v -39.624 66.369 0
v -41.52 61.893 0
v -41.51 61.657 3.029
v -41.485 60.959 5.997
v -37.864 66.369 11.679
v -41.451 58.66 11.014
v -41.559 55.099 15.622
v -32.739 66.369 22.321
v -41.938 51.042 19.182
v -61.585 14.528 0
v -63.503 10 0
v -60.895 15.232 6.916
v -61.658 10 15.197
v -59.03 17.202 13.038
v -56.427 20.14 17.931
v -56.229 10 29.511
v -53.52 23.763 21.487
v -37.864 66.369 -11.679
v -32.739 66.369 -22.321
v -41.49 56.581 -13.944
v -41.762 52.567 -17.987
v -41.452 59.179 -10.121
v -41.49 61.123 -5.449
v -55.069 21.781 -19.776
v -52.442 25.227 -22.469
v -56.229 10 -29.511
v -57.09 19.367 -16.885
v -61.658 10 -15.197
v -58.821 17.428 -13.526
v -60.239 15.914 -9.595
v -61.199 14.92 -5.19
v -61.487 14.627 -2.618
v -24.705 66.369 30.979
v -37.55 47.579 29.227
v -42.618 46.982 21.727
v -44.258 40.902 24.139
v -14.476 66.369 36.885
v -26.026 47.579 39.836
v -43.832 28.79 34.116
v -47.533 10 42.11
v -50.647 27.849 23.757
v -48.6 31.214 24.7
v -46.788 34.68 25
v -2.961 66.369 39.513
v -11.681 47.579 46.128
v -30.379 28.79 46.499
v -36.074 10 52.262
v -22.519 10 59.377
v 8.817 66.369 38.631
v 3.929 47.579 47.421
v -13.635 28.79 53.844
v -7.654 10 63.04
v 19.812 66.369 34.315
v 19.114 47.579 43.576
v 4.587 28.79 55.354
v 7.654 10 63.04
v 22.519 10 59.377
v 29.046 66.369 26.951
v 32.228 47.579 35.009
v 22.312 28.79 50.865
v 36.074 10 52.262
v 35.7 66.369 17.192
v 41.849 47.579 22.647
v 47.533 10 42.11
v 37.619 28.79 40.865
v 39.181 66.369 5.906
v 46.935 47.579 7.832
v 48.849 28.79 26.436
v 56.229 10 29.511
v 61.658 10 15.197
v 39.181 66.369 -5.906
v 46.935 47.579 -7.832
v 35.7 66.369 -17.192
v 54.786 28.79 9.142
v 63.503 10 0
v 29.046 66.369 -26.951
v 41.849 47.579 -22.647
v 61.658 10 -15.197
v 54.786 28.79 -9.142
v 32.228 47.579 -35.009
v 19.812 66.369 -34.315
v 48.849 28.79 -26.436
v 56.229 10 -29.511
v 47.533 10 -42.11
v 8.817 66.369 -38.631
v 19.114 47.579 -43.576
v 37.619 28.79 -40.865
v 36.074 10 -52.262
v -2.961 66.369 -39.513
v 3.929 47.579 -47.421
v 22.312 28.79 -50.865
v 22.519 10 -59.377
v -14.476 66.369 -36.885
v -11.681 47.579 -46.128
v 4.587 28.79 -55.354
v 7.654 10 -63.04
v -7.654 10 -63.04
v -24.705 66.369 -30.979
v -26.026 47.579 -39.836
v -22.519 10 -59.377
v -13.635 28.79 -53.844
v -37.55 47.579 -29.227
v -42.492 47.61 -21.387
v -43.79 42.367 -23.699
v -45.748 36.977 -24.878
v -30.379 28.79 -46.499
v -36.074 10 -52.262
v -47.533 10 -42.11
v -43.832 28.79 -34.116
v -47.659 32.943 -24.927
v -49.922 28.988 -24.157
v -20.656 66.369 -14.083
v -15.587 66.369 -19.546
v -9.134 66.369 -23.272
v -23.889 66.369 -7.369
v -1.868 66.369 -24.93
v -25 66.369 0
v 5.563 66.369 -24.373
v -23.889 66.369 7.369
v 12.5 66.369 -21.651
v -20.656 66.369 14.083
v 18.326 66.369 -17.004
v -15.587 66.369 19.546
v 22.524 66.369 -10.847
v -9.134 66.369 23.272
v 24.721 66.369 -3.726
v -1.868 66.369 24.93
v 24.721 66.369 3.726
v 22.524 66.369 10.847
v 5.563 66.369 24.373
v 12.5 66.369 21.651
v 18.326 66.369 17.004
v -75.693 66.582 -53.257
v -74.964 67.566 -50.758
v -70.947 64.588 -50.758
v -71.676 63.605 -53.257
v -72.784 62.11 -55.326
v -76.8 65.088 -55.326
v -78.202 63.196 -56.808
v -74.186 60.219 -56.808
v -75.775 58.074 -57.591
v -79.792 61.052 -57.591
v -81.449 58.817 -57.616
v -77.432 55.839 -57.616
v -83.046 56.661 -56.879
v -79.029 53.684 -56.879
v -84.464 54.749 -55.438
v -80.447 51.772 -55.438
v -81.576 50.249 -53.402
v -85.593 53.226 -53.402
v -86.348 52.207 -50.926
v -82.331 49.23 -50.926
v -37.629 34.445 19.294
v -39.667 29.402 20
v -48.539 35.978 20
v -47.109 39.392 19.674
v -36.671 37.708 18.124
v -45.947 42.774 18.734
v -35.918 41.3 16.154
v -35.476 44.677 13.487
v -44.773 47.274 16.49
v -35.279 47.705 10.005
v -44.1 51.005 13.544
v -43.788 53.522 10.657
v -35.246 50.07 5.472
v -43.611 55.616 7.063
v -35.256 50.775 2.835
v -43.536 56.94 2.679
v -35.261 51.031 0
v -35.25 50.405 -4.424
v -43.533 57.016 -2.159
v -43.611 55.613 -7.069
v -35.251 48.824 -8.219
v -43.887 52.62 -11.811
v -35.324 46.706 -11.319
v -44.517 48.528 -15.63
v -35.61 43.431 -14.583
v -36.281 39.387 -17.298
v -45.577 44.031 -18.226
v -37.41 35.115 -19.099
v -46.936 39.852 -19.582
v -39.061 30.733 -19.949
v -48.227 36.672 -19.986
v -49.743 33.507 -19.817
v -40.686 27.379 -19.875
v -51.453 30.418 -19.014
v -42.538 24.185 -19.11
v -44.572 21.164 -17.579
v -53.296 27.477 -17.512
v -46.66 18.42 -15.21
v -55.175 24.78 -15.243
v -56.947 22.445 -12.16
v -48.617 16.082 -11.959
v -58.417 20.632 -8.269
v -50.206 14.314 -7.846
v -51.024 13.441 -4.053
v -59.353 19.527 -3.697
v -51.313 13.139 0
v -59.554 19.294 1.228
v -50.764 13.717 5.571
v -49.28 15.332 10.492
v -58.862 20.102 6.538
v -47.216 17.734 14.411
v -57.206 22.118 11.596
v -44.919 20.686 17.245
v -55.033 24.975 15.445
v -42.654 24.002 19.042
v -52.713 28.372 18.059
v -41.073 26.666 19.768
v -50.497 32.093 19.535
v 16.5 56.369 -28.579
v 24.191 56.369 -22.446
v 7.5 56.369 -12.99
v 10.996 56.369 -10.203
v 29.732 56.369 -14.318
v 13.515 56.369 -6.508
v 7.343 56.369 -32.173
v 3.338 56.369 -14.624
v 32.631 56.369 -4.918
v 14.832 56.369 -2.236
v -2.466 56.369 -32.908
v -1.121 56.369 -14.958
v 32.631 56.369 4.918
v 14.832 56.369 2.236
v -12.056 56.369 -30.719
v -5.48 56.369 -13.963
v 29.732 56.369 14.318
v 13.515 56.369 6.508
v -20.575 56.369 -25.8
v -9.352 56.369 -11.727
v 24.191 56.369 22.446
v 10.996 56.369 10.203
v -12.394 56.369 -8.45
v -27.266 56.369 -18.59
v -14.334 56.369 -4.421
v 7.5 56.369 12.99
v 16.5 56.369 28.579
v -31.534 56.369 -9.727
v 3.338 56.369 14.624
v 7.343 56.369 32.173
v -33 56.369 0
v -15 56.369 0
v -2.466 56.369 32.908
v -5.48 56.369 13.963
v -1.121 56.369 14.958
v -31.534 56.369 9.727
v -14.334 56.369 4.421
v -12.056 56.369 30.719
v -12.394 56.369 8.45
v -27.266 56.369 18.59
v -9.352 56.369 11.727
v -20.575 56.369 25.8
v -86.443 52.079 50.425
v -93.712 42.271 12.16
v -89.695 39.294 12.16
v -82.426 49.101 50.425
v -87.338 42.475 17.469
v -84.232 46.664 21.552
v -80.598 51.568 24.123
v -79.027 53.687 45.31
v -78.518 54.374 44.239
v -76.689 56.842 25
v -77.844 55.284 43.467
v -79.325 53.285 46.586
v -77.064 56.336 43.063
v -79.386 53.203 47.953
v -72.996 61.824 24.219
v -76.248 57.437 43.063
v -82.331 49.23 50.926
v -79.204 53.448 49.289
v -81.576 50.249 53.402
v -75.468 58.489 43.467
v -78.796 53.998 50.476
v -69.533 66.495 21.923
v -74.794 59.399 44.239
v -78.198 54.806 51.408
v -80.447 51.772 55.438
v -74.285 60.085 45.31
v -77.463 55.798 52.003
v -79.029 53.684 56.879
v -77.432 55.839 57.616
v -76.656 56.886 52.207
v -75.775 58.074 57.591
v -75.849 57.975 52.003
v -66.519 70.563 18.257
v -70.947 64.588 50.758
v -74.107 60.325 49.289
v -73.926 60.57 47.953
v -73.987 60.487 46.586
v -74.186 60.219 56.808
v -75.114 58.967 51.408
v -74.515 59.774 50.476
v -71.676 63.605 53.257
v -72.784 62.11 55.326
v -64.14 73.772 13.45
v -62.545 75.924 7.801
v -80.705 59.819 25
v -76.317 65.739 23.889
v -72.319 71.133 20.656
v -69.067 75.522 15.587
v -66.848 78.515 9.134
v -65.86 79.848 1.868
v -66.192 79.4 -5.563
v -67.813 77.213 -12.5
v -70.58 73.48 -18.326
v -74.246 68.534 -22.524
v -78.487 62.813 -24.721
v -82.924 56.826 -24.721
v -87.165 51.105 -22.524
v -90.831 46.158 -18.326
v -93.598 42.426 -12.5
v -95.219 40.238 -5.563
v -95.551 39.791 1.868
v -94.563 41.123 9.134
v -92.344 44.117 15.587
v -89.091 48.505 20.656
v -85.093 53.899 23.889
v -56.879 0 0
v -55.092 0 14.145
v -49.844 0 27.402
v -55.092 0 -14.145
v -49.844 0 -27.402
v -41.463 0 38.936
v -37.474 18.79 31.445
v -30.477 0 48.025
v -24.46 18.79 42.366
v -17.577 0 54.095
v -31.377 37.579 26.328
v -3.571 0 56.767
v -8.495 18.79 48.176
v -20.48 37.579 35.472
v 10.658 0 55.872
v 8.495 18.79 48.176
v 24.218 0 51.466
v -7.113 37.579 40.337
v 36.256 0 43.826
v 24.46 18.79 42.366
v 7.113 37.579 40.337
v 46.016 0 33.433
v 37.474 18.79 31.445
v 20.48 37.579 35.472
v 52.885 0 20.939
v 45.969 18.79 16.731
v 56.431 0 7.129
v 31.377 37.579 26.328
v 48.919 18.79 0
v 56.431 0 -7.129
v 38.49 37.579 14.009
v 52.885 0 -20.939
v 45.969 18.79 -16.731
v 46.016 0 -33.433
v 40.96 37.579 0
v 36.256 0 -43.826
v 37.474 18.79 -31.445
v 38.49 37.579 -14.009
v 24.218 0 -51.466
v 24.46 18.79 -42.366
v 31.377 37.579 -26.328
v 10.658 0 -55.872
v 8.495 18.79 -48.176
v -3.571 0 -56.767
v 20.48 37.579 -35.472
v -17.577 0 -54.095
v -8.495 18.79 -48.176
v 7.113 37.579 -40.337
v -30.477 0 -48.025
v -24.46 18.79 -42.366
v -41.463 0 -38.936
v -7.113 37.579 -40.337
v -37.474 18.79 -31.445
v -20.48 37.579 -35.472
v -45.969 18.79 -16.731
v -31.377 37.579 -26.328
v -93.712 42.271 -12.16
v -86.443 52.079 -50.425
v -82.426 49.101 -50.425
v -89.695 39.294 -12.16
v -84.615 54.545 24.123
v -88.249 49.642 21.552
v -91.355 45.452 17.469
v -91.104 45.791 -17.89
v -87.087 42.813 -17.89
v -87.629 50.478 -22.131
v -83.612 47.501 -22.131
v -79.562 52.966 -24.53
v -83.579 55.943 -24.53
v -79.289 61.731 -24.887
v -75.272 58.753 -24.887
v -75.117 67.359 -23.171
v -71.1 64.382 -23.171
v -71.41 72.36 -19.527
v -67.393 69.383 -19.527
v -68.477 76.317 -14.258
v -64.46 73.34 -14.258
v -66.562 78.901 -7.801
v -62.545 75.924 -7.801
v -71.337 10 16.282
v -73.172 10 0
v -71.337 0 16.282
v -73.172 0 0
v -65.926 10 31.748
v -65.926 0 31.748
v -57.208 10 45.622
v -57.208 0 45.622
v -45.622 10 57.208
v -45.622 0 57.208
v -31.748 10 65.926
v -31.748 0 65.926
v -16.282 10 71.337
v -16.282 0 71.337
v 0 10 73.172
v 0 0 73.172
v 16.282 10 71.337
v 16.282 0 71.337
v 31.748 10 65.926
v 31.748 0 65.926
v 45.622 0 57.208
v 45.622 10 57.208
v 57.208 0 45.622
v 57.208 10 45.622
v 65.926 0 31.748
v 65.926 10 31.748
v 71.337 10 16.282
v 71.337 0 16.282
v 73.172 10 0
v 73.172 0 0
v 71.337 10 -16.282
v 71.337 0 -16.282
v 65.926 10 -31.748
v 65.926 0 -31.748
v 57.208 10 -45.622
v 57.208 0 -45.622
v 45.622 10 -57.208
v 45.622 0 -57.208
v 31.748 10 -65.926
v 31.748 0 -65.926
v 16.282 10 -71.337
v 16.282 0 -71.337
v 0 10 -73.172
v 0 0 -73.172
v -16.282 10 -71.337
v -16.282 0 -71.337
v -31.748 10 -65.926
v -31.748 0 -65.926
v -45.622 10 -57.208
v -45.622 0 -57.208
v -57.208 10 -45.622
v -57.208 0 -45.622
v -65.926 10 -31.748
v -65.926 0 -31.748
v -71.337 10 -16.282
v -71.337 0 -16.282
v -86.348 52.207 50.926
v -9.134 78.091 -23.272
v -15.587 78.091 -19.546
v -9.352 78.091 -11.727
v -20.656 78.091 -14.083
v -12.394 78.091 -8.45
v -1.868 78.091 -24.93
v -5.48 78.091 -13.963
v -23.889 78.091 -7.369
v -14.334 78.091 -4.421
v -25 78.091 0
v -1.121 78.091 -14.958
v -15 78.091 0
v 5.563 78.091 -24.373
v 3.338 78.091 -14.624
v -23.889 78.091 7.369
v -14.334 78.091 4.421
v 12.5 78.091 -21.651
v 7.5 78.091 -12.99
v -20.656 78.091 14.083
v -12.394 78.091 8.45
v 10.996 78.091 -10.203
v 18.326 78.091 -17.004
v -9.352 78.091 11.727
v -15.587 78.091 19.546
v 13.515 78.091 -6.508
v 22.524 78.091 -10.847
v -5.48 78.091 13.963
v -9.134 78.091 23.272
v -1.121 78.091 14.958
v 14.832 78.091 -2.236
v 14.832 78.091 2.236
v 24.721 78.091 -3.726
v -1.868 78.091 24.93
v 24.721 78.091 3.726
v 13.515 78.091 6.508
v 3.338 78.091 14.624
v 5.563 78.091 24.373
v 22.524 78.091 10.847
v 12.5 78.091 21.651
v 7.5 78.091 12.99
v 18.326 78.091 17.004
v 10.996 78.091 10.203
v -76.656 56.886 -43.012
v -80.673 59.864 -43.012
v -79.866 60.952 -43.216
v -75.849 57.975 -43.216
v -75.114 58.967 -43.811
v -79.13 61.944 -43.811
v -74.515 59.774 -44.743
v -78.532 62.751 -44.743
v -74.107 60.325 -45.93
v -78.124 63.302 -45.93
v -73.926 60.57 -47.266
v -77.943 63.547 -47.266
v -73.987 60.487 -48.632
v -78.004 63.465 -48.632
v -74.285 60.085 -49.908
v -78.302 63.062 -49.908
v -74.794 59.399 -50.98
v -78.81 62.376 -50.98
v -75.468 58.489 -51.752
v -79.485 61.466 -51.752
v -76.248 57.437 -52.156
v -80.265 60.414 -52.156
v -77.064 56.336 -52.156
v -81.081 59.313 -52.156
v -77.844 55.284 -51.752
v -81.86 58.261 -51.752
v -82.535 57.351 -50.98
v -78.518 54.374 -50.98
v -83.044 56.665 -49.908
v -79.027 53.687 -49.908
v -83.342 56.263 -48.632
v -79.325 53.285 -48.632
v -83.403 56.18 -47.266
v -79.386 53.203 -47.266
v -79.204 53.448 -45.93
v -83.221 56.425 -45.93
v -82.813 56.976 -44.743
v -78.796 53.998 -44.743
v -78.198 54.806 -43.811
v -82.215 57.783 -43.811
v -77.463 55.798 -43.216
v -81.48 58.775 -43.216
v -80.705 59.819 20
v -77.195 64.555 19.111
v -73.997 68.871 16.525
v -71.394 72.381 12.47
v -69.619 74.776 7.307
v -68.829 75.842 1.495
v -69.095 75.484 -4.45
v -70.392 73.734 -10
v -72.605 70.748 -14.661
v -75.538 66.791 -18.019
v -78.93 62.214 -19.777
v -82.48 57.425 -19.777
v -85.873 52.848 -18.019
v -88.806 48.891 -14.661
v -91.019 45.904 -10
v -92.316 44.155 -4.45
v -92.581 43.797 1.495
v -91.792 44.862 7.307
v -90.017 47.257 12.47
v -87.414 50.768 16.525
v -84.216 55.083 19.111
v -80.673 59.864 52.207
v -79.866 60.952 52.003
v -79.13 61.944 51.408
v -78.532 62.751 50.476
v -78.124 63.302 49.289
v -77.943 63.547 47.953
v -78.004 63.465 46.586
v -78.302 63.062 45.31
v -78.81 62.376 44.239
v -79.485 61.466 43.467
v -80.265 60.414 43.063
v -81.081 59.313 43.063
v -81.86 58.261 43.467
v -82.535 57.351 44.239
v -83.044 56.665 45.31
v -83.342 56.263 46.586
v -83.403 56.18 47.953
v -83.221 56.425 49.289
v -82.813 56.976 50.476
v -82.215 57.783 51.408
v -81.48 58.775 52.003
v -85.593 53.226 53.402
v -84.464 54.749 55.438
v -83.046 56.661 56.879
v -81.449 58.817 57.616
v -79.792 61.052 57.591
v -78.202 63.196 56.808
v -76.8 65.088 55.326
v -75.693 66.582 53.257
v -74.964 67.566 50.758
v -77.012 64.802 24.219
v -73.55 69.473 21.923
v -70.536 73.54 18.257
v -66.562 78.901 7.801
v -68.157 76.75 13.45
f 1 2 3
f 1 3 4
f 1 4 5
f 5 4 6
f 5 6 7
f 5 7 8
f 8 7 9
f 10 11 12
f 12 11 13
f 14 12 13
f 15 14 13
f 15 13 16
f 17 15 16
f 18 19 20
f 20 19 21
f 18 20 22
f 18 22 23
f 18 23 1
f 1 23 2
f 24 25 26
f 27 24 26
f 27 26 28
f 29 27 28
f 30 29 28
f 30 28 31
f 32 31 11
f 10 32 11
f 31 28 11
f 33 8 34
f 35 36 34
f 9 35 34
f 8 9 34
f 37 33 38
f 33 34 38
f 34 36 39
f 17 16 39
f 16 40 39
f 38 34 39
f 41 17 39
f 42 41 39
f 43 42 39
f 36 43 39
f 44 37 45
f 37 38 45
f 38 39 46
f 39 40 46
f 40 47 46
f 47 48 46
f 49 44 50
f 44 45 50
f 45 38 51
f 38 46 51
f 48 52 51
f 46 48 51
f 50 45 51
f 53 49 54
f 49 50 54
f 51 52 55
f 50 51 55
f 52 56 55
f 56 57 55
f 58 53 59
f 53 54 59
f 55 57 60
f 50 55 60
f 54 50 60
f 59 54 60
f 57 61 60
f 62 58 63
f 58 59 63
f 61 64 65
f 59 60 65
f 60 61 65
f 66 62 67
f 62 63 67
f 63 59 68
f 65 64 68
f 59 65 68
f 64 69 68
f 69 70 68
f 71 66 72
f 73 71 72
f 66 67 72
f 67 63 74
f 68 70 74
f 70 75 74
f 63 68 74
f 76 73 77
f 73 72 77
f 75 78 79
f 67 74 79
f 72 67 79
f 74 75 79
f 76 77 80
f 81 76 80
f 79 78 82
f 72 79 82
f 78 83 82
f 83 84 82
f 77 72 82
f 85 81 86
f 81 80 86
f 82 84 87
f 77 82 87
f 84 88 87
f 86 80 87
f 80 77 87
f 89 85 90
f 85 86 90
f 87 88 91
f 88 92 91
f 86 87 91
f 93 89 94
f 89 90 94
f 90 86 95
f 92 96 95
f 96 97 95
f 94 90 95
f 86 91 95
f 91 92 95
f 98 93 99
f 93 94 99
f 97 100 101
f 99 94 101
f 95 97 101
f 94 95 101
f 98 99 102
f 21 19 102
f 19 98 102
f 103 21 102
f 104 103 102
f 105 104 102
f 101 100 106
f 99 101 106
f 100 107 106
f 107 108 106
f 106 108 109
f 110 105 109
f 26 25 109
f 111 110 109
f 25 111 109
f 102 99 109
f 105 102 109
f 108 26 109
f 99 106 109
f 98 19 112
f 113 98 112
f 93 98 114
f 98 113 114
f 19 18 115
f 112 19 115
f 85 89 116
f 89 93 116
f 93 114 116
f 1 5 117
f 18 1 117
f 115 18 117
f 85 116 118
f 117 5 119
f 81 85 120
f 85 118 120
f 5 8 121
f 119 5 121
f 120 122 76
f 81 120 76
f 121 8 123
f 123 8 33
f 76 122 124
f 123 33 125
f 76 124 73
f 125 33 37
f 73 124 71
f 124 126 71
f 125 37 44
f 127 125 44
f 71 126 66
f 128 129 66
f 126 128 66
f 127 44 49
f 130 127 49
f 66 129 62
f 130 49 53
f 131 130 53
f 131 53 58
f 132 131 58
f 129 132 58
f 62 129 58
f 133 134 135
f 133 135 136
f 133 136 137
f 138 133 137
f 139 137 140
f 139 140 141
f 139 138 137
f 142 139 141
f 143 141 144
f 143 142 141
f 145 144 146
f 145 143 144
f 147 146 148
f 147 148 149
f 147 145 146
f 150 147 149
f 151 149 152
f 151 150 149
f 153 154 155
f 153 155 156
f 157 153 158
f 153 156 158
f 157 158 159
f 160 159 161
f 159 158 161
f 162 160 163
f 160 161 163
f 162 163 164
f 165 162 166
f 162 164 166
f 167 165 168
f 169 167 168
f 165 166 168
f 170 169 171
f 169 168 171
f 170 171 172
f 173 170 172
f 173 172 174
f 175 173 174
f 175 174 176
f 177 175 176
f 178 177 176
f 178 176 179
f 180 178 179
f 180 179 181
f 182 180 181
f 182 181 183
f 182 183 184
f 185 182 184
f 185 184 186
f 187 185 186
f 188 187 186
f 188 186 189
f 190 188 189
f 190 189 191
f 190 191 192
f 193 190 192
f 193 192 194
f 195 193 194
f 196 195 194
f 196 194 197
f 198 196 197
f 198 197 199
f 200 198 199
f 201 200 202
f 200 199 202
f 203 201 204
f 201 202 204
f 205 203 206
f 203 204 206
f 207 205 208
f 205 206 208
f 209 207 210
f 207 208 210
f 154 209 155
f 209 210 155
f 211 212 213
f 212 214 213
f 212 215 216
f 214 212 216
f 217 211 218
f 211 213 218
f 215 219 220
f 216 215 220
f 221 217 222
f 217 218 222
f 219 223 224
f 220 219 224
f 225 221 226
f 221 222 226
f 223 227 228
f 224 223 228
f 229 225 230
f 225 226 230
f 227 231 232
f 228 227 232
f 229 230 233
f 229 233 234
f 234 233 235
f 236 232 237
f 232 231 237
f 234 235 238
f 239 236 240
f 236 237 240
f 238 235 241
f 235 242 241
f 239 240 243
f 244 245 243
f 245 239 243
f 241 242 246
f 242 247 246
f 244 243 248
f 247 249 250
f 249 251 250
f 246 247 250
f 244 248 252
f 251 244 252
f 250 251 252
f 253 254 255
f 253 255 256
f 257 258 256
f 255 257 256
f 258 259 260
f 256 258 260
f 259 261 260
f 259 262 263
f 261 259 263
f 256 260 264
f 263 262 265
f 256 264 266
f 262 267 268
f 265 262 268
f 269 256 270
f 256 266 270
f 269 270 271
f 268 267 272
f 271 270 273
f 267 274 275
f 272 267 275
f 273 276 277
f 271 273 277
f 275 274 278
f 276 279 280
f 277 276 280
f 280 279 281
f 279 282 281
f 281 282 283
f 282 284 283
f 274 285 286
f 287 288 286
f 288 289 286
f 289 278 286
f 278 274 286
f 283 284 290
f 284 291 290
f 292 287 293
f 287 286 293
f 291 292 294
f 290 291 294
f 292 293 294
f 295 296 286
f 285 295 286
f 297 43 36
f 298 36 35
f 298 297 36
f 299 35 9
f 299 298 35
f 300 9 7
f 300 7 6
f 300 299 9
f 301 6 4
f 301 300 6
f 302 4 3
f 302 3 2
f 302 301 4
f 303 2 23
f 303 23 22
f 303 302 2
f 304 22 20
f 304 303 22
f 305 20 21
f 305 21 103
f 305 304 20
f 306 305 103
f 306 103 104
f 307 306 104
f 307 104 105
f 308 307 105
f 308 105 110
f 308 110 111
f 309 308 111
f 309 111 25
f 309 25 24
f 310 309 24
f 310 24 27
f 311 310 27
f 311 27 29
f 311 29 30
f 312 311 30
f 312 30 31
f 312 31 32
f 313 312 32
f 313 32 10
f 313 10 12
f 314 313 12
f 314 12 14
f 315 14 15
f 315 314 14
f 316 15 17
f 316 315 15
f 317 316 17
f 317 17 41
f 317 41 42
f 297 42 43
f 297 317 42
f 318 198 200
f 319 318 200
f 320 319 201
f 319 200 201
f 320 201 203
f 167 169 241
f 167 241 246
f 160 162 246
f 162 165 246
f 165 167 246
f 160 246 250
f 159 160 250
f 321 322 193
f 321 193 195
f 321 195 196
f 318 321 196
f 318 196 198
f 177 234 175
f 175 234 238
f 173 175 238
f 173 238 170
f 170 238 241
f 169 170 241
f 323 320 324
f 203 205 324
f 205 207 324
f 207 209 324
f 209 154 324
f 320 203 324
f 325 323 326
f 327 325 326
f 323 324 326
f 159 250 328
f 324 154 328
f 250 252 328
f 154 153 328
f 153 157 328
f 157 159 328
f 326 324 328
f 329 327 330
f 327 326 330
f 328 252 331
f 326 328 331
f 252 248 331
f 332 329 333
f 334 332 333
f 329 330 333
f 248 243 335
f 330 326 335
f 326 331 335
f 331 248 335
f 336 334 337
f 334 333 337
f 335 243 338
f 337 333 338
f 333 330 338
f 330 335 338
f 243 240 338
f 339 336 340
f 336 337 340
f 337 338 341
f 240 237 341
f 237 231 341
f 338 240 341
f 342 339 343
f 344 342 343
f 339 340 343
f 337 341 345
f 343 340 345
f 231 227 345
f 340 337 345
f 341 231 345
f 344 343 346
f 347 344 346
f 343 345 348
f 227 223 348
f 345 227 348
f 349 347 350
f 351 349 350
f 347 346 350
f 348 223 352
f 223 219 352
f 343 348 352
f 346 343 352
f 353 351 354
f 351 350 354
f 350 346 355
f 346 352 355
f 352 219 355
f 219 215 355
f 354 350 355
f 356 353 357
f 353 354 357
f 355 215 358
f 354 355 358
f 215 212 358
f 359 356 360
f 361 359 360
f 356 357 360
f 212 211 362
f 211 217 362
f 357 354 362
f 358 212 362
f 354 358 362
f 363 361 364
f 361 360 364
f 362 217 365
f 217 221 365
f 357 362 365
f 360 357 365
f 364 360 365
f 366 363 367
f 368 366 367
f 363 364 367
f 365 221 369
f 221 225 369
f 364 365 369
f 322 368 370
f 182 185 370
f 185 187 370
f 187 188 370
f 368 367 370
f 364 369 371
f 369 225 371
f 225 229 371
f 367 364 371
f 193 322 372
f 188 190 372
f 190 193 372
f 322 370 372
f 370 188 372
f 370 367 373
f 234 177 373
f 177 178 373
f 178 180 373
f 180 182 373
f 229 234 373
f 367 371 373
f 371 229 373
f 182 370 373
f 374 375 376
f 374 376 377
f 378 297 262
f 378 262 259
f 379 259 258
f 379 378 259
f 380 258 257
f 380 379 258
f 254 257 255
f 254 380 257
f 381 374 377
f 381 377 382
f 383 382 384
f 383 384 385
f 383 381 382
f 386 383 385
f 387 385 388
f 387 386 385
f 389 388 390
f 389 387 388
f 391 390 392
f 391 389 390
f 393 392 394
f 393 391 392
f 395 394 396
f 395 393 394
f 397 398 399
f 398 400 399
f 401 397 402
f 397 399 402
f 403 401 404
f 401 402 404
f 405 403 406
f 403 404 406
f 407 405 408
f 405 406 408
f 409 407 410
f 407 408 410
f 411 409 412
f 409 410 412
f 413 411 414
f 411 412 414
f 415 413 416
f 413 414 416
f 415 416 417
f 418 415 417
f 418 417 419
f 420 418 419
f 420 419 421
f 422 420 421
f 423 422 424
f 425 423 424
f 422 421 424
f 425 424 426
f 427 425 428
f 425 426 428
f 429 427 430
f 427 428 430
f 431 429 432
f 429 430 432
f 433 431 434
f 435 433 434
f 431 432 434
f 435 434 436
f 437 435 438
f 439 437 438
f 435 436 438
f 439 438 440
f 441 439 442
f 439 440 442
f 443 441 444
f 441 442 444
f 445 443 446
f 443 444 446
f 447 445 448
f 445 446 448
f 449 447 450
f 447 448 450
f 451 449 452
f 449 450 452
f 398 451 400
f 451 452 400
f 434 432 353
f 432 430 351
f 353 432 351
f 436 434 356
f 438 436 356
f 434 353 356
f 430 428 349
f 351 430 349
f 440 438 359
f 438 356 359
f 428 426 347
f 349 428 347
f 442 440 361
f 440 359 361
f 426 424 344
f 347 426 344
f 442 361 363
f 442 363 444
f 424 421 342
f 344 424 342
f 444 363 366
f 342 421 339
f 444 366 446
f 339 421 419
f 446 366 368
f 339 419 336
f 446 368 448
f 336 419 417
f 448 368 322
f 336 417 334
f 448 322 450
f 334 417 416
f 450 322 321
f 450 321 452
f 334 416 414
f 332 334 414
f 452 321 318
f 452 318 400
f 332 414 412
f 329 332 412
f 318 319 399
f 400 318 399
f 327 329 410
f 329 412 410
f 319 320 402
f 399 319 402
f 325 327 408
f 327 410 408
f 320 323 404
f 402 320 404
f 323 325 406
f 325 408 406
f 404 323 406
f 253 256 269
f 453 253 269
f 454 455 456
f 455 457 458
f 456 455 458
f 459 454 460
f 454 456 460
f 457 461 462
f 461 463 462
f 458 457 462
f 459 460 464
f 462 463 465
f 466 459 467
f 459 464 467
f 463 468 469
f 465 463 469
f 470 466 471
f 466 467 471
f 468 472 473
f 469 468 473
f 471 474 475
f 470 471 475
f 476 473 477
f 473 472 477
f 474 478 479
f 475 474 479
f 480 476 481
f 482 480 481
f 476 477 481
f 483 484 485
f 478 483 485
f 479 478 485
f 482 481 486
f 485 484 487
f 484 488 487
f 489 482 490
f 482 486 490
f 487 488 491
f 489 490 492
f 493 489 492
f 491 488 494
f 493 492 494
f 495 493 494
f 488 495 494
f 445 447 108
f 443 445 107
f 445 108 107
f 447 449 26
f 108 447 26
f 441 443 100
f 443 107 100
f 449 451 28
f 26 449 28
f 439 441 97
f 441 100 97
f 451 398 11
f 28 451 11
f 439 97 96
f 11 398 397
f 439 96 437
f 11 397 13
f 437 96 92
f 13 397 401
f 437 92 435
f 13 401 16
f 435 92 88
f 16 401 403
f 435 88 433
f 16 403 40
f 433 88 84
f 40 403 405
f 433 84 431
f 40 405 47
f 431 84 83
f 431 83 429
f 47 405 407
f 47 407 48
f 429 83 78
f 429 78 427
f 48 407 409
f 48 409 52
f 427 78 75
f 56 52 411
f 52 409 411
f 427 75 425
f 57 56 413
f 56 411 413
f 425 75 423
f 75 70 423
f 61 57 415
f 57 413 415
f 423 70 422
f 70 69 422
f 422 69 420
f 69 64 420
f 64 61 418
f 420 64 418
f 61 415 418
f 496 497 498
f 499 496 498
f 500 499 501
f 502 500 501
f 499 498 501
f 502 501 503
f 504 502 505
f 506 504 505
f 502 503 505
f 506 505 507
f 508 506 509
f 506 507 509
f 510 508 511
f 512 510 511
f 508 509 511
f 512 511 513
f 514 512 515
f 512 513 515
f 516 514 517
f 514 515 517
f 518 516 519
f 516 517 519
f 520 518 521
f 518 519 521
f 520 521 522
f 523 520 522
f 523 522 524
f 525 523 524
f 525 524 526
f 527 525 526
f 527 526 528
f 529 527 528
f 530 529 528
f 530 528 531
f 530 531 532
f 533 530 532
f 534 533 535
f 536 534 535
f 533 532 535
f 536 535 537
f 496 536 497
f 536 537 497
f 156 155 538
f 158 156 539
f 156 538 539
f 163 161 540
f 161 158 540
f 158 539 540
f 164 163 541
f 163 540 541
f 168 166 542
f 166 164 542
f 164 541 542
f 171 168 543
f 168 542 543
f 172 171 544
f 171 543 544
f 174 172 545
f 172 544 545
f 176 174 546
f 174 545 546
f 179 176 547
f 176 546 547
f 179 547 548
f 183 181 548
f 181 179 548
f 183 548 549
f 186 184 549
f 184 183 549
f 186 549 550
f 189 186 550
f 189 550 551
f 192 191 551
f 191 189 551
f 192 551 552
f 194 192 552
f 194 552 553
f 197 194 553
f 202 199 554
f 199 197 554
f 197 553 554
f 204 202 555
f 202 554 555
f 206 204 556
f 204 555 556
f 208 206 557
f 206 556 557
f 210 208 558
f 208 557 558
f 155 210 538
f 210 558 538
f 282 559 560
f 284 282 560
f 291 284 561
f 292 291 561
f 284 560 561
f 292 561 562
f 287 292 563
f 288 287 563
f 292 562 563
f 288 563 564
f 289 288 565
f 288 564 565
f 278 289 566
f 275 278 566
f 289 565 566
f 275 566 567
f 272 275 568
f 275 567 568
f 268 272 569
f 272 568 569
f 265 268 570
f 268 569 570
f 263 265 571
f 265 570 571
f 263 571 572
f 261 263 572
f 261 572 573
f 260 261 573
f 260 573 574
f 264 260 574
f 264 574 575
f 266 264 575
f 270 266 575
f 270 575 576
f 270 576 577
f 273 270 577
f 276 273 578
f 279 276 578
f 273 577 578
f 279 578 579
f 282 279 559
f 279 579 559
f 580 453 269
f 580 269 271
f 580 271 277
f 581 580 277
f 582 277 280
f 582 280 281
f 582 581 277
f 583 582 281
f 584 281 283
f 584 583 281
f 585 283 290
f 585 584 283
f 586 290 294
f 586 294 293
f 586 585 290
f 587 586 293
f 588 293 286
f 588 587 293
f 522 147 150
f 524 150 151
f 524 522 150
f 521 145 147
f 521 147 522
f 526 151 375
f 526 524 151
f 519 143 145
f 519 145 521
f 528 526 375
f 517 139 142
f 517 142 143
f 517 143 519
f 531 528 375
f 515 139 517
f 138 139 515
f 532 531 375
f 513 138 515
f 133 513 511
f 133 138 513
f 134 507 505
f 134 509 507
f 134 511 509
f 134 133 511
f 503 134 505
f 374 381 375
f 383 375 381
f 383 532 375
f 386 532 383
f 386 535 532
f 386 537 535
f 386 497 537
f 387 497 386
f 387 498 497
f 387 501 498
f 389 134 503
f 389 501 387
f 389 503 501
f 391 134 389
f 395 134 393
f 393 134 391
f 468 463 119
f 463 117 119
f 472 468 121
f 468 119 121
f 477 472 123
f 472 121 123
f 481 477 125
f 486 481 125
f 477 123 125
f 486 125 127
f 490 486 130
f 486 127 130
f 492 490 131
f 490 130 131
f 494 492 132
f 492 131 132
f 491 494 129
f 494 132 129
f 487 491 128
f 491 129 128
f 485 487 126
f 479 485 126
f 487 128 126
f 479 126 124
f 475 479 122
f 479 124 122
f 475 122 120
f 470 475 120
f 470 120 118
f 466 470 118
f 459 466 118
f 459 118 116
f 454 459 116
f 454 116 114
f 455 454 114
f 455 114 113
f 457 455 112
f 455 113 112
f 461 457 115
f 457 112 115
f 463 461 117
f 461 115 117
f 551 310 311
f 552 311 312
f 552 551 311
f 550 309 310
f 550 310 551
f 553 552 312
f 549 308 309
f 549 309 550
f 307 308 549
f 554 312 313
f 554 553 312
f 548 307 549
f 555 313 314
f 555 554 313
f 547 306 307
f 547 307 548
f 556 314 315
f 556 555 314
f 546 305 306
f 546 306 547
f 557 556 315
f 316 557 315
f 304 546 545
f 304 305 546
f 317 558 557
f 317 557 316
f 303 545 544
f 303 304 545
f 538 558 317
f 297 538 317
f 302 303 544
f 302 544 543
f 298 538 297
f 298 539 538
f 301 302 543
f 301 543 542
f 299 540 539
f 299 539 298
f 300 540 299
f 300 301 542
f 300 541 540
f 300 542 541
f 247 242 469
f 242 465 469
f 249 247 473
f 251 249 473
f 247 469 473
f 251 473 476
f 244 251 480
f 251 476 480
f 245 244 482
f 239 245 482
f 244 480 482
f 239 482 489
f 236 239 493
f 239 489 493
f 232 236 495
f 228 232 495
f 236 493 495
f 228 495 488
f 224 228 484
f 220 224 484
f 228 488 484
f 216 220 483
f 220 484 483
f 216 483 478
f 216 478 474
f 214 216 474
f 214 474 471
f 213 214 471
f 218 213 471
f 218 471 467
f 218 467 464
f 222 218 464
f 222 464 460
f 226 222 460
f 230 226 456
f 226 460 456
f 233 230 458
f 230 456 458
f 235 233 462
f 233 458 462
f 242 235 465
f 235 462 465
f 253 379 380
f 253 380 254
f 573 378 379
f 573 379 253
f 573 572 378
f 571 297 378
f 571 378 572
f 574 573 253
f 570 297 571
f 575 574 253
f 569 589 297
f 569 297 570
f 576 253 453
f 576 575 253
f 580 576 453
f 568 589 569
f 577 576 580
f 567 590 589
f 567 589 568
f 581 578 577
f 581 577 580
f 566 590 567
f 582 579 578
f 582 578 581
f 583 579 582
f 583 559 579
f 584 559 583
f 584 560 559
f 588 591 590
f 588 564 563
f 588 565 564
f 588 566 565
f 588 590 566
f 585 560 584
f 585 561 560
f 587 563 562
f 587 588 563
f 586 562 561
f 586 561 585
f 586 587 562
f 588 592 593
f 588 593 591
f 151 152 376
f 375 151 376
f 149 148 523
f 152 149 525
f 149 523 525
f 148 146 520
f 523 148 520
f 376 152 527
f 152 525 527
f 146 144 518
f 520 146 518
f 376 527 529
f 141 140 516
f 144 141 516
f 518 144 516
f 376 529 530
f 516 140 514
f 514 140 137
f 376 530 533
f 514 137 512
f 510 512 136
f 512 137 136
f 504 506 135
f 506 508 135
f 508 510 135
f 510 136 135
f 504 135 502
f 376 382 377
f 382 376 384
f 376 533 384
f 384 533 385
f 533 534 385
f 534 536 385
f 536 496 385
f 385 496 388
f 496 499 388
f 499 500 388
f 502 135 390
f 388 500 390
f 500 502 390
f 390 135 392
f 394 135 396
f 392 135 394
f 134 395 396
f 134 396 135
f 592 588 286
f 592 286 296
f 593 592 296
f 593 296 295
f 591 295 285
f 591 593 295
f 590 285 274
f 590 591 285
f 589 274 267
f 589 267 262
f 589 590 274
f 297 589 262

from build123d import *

# Parameters (mm, degrees)
SKETCH_4_R               = 4.59762215
EXTRUDE_1_DEPTH          = 5
EXTRUDE_1_2_DEPTH        = 5
EXTRUDE_2_REACH          = 182.584
SKETCH_4_3_R             = 25
SKETCH_4_3_R_2           = 20
CUT_EXTRUDE_1_DEPTH      = 181.584399592
CUT_EXTRUDE_1_DEPTH_BACK = 181.584399592
SKETCH_4_4_R             = 20


with BuildPart() as part:
    # 草图1 → 旋转1 (revolve)
    with BuildSketch(Plane.XY):
        Polygon((-15, 78.091052065), (-25, 78.091052065), (-25, 66.368643655), (-39.624031204, 66.368643655), (-63.50324307, 10), (-73.171930675, 10), (-73.171930675, 0), (-56.879211865, 0), (-33, 56.368643655), (-15, 56.368643655), align=None)
    revolve(axis=Axis((0, 0, 0), (0, 1, 0)))

    # 草图4<3> → 凸台-拉伸2 (add, up to next)
    with BuildSketch(Plane(origin=(-80.705417736, 59.819357933, 0), x_dir=(0, 0, 1), z_dir=(-0.8033782926562896, 0.5954689907028451, 0)), mode=Mode.PRIVATE) as extrude_2_sk1:
        Circle(SKETCH_4_3_R)
        Circle(SKETCH_4_3_R_2, mode=Mode.SUBTRACT)
    extrude_2_tool1 = extrude(extrude_2_sk1.sketch, amount=-EXTRUDE_2_REACH, mode=Mode.PRIVATE) - part.part
    add(extrude_2_tool1.solids().sort_by_distance((-80.705418, 59.819358, -24.292893))[0])

    # 草图4<4> → 切除-拉伸1 (cut, two sides: drawn at the far end of the back side and taken through both)
    with BuildSketch(Plane(origin=(-80.705417736, 59.819357933, 0), x_dir=(0, 0, 1), z_dir=(-0.8033782926562896, 0.5954689907028451, 0)).offset(-CUT_EXTRUDE_1_DEPTH_BACK)):
        Circle(SKETCH_4_4_R)
    extrude(amount=CUT_EXTRUDE_1_DEPTH + CUT_EXTRUDE_1_DEPTH_BACK, mode=Mode.SUBTRACT)


with BuildPart() as body_2:
    # 草图4 → 凸台-拉伸1 (new body)
    with BuildSketch(Plane(origin=(-80.705417736, 59.819357933, 0), x_dir=(0, 0, 1), z_dir=(-0.8033782926562896, 0.5954689907028451, 0))):
        with BuildLine():
            ThreePointArc((-12.160297615, -21.843240646), (-24.886535213, 2.379152178), (-7.801433677, 23.751581686))
            Line((-7.801433677, 23.751581686), (-50.758201751, 9.642021256))
            ThreePointArc((-50.758201751, 9.642021256), (-57.699738806, 0.143582546), (-50.92588329, -9.475157291))
            Line((-50.92588329, -9.475157291), (-12.160297615, -21.843240646))
        make_face()
        with Locations((-47.609278287, 0.055076602)):
            Circle(SKETCH_4_R, mode=Mode.SUBTRACT)
    extrude(amount=-EXTRUDE_1_DEPTH)


with BuildPart() as body_3:
    # 草图4 → Extrude 1 2 (new body)
    with BuildSketch(Plane(origin=(-80.705417736, 59.819357933, 0), x_dir=(0, 0, 1), z_dir=(-0.8033782926562896, 0.5954689907028451, 0))):
        with BuildLine():
            Line((50.758201751, 9.642021256), (7.801433677, 23.751581686))
            ThreePointArc((7.801433677, 23.751581686), (24.886535213, 2.379152178), (12.160297615, -21.843240646))
            Line((12.160297615, -21.843240646), (50.92588329, -9.475157291))
            ThreePointArc((50.92588329, -9.475157291), (57.699738806, 0.143582546), (50.758201751, 9.642021256))
        make_face()
        with Locations((47.609278287, 0.055076602)):
            Circle(SKETCH_4_R, mode=Mode.SUBTRACT)
    extrude(amount=-EXTRUDE_1_2_DEPTH)


solid = Compound([part.part, body_2.part, body_3.part])
